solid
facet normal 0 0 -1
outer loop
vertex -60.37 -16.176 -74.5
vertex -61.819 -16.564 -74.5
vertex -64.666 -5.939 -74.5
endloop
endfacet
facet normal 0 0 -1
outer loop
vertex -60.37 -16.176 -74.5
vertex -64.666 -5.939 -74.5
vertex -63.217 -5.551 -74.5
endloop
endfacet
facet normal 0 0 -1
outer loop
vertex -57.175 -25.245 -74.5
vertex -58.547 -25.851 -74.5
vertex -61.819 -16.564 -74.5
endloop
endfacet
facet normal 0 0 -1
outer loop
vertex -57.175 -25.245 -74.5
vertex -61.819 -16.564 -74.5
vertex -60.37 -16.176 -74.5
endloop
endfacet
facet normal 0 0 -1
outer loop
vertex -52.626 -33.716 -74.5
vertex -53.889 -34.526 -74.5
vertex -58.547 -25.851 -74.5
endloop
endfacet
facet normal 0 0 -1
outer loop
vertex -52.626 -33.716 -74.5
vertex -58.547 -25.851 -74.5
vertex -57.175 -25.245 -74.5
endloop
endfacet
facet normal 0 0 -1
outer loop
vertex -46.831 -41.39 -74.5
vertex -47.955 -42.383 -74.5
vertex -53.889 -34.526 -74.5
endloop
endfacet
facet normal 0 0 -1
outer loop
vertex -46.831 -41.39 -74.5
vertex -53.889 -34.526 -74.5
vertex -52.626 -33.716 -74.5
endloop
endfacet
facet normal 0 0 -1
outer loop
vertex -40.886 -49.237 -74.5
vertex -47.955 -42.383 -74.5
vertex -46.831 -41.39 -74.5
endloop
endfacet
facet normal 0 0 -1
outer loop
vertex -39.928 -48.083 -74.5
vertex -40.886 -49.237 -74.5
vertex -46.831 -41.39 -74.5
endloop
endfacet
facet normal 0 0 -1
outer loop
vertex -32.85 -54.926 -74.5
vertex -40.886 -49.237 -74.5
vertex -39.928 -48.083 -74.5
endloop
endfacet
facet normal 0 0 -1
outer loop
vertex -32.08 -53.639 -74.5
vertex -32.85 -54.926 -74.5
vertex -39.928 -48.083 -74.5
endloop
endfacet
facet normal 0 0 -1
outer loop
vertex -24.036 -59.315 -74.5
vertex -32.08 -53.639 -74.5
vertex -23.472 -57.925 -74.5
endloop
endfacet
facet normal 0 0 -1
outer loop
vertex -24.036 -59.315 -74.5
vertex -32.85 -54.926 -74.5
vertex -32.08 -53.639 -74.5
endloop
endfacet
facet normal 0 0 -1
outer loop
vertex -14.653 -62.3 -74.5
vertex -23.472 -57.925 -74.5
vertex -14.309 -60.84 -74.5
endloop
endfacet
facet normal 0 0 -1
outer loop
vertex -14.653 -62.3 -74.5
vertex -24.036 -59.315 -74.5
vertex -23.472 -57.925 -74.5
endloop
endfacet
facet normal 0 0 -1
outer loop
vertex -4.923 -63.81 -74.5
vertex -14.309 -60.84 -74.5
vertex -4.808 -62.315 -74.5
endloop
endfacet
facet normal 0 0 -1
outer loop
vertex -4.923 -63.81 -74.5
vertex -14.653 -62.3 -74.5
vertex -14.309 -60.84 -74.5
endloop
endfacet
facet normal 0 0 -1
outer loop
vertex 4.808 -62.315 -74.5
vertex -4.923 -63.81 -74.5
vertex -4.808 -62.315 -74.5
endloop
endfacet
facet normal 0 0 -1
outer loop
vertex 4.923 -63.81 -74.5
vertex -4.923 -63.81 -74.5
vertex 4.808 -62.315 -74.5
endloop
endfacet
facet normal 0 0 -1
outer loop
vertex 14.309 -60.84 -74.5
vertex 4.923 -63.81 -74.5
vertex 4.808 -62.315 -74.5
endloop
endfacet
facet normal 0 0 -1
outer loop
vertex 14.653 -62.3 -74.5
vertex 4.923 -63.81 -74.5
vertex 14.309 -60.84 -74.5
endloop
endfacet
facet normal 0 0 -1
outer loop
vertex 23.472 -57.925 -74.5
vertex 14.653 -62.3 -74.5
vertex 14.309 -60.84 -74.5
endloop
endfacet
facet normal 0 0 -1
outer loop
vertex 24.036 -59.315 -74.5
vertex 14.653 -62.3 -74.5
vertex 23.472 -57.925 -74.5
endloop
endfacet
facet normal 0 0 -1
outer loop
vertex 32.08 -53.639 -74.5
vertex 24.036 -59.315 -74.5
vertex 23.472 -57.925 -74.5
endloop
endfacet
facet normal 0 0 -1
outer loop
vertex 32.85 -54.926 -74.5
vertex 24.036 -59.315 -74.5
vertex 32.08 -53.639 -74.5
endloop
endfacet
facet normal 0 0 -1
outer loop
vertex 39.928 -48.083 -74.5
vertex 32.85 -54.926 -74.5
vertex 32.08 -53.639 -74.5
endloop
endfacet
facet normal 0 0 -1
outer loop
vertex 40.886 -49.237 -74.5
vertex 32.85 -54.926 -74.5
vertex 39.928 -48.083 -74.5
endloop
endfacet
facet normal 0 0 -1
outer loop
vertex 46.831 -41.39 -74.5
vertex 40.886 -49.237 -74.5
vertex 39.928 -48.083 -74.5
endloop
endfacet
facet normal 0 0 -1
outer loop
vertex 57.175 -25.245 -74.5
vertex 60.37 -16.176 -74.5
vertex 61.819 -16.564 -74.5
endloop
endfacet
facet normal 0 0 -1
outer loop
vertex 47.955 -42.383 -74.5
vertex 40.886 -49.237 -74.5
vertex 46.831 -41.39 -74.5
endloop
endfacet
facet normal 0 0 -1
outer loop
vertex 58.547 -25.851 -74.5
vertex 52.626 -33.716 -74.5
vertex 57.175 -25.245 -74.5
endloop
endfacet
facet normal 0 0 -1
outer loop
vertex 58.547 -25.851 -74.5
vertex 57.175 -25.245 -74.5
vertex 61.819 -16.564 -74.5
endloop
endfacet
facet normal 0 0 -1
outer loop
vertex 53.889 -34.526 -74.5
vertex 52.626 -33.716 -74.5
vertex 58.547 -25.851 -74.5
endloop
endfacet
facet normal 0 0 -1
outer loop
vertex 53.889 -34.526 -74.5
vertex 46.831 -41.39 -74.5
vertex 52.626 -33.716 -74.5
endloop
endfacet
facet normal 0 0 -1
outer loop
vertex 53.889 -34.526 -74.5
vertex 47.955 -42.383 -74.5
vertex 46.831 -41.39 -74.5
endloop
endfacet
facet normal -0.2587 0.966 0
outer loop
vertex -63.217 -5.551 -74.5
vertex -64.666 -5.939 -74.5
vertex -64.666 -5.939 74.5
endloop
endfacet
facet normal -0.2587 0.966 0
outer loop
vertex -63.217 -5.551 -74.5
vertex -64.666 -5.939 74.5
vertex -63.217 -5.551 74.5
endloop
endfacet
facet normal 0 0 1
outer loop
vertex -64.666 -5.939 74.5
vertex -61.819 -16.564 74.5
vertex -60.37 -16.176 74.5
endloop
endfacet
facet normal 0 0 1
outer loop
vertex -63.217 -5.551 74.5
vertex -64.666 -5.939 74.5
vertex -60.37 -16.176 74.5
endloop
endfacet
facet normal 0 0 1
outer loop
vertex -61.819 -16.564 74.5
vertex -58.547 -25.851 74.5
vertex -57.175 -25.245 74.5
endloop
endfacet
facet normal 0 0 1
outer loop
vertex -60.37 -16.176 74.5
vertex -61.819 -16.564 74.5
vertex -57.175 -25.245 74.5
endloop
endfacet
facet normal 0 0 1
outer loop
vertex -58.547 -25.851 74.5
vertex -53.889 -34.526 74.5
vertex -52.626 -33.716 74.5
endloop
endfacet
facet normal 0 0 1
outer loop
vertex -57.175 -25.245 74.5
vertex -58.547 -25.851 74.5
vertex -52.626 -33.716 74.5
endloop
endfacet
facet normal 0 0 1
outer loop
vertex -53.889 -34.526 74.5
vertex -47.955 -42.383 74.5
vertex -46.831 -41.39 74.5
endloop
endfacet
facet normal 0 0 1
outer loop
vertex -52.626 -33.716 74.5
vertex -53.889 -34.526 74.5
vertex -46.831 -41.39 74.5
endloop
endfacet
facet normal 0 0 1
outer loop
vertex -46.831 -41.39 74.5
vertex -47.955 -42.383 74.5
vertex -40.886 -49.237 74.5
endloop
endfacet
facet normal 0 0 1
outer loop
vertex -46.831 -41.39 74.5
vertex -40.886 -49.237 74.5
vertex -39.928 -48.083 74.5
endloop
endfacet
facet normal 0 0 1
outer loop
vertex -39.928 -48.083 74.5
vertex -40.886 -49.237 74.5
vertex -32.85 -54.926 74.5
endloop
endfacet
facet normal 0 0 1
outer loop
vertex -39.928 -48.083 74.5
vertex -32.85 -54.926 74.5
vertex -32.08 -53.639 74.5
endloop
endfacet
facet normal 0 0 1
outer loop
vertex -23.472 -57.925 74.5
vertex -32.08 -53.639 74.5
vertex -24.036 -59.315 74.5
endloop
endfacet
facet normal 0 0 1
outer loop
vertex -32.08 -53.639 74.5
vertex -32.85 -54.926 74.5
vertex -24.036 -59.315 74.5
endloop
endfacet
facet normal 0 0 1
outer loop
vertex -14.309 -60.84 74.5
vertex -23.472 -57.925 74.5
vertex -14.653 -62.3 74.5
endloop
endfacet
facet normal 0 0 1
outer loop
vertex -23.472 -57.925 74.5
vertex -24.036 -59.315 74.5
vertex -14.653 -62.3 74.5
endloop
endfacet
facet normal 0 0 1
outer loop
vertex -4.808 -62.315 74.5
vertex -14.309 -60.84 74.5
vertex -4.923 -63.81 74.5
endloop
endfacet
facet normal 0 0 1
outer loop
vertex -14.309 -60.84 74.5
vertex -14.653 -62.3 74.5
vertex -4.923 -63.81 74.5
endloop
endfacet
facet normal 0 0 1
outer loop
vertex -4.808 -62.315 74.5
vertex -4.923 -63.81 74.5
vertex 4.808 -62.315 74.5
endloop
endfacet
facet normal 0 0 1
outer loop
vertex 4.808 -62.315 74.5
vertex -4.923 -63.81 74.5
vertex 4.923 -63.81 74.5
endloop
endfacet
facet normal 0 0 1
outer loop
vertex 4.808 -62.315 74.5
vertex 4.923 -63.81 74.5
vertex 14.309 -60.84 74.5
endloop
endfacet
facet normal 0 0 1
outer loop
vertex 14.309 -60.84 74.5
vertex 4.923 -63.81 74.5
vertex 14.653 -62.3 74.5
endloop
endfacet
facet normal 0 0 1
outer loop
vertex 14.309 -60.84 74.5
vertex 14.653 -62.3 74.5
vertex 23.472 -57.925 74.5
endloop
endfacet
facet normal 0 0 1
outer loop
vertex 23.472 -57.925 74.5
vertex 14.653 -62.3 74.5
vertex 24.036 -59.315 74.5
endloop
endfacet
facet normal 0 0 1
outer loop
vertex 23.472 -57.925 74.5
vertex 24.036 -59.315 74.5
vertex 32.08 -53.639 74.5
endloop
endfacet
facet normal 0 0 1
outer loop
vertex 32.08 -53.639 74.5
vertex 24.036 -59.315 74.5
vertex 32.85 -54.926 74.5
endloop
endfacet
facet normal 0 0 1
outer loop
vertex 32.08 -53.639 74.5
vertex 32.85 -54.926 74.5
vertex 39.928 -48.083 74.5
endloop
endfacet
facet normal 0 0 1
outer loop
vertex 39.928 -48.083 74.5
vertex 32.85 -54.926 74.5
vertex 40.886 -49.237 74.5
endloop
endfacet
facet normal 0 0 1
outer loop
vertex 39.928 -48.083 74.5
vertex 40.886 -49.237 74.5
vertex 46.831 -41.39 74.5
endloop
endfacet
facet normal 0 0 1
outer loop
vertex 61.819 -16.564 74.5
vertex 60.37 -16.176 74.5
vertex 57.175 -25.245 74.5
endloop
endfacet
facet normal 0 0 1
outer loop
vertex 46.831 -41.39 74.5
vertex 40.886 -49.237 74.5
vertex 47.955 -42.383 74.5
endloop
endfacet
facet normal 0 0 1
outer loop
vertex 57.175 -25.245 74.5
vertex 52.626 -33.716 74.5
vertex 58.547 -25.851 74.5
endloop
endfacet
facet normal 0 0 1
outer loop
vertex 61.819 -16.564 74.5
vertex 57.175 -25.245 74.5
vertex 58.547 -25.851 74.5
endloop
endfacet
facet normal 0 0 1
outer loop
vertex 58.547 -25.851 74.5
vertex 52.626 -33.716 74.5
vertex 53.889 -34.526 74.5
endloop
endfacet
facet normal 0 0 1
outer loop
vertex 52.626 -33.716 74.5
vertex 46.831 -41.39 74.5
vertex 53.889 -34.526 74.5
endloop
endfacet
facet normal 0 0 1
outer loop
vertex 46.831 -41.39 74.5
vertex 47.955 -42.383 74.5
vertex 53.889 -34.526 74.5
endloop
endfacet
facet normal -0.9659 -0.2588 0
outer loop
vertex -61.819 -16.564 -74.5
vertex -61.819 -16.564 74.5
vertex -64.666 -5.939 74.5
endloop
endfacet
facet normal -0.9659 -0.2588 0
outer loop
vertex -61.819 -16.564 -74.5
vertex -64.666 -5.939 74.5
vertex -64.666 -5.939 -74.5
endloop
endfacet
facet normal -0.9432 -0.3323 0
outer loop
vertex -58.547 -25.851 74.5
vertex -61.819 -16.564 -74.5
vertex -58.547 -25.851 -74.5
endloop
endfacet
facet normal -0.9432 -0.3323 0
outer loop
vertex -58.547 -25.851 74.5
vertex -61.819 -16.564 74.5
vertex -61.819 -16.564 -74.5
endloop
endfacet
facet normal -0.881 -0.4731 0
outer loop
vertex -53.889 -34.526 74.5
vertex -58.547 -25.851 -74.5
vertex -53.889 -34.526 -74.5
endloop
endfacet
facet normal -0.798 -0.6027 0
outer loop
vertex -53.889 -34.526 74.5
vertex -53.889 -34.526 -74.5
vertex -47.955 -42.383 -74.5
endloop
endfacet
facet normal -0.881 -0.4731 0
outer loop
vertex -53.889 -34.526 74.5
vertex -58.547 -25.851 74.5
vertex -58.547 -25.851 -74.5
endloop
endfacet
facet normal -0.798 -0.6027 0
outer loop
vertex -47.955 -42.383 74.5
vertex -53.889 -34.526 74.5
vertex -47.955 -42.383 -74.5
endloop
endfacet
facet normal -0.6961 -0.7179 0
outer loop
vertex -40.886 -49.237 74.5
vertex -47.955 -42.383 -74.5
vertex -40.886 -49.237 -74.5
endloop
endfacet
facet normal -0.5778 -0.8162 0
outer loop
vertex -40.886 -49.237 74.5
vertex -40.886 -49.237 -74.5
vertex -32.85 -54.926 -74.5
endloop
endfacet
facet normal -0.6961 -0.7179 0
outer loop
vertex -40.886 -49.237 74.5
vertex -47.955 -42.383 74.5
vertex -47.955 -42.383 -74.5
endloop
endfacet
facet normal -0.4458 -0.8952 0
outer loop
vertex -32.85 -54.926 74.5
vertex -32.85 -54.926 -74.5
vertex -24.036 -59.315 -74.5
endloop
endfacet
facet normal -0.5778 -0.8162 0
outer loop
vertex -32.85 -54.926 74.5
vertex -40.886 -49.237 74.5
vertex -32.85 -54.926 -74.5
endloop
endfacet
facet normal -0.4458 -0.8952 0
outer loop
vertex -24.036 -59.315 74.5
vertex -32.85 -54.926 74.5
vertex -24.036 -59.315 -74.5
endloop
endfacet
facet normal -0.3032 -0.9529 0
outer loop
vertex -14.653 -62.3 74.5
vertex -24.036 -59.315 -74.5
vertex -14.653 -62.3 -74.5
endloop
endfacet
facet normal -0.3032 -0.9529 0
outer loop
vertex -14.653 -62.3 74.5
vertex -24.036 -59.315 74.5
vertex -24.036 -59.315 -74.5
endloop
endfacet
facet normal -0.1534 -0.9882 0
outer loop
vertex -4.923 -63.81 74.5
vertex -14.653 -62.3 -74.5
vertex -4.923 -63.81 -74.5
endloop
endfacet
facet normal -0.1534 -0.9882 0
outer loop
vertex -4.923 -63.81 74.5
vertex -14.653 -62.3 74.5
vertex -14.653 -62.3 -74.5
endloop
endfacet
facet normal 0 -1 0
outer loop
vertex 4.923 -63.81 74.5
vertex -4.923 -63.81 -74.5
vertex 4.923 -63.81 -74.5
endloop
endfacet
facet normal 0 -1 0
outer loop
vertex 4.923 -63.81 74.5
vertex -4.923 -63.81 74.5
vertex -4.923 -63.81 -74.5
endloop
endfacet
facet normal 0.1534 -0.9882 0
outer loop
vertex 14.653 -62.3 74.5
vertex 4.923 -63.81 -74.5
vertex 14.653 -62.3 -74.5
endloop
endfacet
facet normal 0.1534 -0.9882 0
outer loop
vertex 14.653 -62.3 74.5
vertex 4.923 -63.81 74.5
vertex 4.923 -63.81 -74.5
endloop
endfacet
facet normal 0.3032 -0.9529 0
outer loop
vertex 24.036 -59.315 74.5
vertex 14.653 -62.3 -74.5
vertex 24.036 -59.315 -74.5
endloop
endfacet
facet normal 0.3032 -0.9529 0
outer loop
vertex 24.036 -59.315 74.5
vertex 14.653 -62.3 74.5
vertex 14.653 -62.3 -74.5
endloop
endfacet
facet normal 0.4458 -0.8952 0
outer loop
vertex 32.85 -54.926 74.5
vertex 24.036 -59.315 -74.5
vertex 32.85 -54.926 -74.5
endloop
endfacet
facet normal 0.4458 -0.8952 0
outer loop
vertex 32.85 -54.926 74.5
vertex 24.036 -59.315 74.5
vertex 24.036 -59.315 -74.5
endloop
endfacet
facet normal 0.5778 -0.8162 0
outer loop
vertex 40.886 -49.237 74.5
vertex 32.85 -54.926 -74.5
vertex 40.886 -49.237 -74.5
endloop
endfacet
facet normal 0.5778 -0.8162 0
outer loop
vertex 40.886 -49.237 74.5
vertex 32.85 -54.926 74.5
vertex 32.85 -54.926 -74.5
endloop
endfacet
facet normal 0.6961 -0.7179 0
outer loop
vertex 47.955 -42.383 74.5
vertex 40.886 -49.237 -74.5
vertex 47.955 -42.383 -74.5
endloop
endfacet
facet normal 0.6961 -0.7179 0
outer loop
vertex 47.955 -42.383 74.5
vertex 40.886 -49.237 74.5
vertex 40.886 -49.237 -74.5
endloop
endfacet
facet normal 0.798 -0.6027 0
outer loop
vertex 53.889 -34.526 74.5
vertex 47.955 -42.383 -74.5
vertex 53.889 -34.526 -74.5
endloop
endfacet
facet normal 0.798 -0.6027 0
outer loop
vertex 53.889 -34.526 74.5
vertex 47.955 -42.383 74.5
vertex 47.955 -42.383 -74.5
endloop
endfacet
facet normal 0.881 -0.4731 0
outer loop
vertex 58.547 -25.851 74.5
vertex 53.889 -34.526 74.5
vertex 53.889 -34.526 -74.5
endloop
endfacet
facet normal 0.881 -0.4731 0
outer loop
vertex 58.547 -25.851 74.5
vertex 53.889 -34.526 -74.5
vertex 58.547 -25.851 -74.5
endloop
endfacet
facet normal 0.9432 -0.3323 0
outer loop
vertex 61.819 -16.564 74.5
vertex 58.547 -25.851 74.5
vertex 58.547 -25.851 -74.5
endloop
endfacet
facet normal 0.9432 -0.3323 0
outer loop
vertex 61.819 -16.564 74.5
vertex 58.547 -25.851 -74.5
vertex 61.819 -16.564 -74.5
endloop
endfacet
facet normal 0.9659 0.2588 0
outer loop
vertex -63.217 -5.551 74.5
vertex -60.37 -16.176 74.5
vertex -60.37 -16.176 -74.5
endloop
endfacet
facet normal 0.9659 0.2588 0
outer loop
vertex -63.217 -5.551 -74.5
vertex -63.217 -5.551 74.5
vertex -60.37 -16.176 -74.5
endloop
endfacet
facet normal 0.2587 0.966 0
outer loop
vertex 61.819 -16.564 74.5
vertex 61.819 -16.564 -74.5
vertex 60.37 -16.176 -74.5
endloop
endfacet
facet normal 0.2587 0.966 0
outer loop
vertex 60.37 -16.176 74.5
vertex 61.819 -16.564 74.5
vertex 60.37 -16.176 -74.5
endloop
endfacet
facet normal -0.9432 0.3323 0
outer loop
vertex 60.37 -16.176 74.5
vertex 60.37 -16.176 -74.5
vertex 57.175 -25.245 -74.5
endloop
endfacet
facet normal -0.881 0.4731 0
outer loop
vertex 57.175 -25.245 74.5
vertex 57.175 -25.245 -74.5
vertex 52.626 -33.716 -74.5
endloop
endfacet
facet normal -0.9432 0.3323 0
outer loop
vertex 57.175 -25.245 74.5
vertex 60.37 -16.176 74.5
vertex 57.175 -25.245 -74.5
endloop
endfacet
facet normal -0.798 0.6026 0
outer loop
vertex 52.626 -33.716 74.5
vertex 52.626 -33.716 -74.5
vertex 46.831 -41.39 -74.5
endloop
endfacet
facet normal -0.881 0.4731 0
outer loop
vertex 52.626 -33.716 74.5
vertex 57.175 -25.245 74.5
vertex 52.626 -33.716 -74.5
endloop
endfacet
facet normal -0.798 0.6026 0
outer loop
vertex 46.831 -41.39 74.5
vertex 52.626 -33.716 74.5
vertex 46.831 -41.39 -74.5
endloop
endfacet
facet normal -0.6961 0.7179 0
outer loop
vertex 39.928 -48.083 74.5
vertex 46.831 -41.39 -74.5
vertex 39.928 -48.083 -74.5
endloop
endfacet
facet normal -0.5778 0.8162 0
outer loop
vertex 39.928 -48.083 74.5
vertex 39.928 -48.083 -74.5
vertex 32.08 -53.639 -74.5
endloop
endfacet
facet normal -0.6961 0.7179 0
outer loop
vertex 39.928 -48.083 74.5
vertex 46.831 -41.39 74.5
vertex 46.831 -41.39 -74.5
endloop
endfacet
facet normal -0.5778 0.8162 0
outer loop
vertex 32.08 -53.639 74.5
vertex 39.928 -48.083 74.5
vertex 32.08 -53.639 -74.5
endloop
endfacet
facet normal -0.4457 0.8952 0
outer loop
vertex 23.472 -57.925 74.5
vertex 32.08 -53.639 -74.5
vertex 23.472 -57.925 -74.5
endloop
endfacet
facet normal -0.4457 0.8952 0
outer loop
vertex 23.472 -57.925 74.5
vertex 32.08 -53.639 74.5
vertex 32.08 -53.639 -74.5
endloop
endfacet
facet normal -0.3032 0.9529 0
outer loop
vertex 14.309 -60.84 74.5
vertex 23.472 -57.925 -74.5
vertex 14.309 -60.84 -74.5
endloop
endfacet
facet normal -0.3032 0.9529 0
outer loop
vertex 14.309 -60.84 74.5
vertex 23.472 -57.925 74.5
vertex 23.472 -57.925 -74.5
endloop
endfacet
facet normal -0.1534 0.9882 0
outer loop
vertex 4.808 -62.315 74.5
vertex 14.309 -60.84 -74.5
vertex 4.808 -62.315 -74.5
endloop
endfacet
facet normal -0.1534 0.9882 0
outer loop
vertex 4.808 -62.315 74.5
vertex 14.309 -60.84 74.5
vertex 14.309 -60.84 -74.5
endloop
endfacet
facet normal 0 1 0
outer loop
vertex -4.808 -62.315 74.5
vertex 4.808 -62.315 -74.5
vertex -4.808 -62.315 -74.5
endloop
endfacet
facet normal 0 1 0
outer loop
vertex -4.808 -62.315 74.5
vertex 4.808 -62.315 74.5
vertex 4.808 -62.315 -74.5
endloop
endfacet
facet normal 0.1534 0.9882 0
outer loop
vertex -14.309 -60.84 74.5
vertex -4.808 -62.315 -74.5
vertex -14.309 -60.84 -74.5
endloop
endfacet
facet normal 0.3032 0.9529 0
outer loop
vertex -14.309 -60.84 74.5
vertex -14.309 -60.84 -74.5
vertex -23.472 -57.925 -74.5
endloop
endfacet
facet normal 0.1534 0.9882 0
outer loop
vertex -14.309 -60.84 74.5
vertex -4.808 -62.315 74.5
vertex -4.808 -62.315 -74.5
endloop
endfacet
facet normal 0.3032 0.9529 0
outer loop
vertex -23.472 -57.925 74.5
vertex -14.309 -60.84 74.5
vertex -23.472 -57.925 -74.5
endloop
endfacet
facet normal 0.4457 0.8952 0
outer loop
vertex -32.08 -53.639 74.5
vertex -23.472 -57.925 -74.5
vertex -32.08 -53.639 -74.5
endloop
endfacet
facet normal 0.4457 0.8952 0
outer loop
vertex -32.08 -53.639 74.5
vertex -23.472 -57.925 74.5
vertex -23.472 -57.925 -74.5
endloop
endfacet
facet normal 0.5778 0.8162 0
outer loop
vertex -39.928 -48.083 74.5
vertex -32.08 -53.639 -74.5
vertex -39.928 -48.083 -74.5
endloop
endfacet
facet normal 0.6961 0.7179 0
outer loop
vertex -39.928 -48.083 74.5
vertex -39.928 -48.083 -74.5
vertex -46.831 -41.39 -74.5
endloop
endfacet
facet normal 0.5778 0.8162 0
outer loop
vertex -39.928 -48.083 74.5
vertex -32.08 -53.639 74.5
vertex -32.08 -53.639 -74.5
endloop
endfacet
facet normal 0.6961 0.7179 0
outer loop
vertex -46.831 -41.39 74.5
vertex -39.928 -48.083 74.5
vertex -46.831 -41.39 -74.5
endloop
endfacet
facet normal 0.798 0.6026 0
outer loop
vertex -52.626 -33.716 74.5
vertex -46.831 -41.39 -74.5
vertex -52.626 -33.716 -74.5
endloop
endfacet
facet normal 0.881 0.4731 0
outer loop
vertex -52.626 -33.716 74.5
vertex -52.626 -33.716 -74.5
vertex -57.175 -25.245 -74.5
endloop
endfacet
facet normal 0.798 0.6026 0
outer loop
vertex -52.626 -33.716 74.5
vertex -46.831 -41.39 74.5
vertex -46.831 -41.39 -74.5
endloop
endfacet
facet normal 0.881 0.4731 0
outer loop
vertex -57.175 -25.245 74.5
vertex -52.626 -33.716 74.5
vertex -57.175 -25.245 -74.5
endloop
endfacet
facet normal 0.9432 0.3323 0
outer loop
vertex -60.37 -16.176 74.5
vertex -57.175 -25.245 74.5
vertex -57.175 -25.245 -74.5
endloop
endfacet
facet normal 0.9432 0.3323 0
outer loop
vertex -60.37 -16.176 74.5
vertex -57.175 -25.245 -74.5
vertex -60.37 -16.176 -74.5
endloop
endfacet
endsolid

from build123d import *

# Parameters (mm, degrees)
BOSS_EXTRUDE1_DEPTH = 74.5
SKETCH2_W           = 1.5
SKETCH2_H           = 149
BOSS_EXTRUDE2_DEPTH = 11


with BuildPart() as part:
    # Sketch1 → Boss-Extrude1 (new, symmetric)
    with BuildSketch(Plane.XY):
        with BuildLine():
            Line((61.819252883, -16.564418887), (60.370364143, -16.176190319))
            ThreePointArc((60.370364143, -16.176190319), (0, -62.5), (-60.370364143, -16.176190319))
            Line((-60.370364143, -16.176190319), (-61.819252883, -16.564418887))
            ThreePointArc((-61.819252883, -16.564418887), (0, -64), (61.819252883, -16.564418887))
        make_face()
    extrude(amount=BOSS_EXTRUDE1_DEPTH, both=True)

    # Sketch2 → Boss-Extrude2 (add)
    with BuildSketch(Plane(origin=(0, 0, 0), x_dir=(0.9659258262890683, 0.25881904510252113, 0), z_dir=(-0.25881904510252113, 0.9659258262890683, 0))):
        with Locations((-63.25, 0)):
            Rectangle(SKETCH2_W, SKETCH2_H)
    extrude(amount=BOSS_EXTRUDE2_DEPTH)


solid = part.part
